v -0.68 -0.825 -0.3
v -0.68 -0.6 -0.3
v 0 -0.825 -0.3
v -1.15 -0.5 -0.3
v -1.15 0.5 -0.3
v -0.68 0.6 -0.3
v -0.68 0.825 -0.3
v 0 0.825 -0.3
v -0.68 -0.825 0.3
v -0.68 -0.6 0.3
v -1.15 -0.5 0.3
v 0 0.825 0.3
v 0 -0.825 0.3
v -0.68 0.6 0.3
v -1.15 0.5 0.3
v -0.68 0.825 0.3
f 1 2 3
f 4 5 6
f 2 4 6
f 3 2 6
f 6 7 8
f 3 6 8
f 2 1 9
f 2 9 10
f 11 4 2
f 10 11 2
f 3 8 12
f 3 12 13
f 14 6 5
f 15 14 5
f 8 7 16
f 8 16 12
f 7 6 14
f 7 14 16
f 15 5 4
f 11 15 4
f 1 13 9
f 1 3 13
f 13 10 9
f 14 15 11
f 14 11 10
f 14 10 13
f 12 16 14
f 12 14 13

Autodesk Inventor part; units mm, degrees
ref_plane "YZ Plane" through (0, 0, 0) normal (1, 0, 0) x (0, 1, 0)
ref_plane "XZ Plane" through (0, 0, 0) normal (0, 1, 0) x (-1, 0, 0)
ref_plane "XY Plane" through (0, 0, 0) normal (0, 0, 1) x (1, 0, 0)
sketch "Sketch1" plane through (0, 0, 0) normal (0, 0, 1) x (1, 0, 0)
  line L0 (0, 0) -> (21.5711, 0)
  line L1 (-0.68, 0.825) -> (0, 0.825)
  line L2 (0, 0.825) -> (0, -0.825)
  line L3 (0, -0.825) -> (-0.68, -0.825)
  line L4 (-0.68, 0.6) -> (-1.15, 0.5)
  line L5 (-1.15, 0.5) -> (-1.15, -0.5)
  line L6 (-1.15, -0.5) -> (-0.68, -0.6)
  line L7 (-0.68, -0.825) -> (-0.68, -0.6)
  line L8 (-0.68, 0.6) -> (-0.68, 0.825)
  point P0 (0, 0)
  dimension "d2" = 0.68
  dimension "d3" = 1.65
  dimension "d4" = 1.2
  dimension "d5" = 1
  dimension "d6" = 1.15
extrude "Extrusion1" add sketch "Sketch1" along normal mid plane 0.6
properties part number "LED_LTST-S270KFKT"
